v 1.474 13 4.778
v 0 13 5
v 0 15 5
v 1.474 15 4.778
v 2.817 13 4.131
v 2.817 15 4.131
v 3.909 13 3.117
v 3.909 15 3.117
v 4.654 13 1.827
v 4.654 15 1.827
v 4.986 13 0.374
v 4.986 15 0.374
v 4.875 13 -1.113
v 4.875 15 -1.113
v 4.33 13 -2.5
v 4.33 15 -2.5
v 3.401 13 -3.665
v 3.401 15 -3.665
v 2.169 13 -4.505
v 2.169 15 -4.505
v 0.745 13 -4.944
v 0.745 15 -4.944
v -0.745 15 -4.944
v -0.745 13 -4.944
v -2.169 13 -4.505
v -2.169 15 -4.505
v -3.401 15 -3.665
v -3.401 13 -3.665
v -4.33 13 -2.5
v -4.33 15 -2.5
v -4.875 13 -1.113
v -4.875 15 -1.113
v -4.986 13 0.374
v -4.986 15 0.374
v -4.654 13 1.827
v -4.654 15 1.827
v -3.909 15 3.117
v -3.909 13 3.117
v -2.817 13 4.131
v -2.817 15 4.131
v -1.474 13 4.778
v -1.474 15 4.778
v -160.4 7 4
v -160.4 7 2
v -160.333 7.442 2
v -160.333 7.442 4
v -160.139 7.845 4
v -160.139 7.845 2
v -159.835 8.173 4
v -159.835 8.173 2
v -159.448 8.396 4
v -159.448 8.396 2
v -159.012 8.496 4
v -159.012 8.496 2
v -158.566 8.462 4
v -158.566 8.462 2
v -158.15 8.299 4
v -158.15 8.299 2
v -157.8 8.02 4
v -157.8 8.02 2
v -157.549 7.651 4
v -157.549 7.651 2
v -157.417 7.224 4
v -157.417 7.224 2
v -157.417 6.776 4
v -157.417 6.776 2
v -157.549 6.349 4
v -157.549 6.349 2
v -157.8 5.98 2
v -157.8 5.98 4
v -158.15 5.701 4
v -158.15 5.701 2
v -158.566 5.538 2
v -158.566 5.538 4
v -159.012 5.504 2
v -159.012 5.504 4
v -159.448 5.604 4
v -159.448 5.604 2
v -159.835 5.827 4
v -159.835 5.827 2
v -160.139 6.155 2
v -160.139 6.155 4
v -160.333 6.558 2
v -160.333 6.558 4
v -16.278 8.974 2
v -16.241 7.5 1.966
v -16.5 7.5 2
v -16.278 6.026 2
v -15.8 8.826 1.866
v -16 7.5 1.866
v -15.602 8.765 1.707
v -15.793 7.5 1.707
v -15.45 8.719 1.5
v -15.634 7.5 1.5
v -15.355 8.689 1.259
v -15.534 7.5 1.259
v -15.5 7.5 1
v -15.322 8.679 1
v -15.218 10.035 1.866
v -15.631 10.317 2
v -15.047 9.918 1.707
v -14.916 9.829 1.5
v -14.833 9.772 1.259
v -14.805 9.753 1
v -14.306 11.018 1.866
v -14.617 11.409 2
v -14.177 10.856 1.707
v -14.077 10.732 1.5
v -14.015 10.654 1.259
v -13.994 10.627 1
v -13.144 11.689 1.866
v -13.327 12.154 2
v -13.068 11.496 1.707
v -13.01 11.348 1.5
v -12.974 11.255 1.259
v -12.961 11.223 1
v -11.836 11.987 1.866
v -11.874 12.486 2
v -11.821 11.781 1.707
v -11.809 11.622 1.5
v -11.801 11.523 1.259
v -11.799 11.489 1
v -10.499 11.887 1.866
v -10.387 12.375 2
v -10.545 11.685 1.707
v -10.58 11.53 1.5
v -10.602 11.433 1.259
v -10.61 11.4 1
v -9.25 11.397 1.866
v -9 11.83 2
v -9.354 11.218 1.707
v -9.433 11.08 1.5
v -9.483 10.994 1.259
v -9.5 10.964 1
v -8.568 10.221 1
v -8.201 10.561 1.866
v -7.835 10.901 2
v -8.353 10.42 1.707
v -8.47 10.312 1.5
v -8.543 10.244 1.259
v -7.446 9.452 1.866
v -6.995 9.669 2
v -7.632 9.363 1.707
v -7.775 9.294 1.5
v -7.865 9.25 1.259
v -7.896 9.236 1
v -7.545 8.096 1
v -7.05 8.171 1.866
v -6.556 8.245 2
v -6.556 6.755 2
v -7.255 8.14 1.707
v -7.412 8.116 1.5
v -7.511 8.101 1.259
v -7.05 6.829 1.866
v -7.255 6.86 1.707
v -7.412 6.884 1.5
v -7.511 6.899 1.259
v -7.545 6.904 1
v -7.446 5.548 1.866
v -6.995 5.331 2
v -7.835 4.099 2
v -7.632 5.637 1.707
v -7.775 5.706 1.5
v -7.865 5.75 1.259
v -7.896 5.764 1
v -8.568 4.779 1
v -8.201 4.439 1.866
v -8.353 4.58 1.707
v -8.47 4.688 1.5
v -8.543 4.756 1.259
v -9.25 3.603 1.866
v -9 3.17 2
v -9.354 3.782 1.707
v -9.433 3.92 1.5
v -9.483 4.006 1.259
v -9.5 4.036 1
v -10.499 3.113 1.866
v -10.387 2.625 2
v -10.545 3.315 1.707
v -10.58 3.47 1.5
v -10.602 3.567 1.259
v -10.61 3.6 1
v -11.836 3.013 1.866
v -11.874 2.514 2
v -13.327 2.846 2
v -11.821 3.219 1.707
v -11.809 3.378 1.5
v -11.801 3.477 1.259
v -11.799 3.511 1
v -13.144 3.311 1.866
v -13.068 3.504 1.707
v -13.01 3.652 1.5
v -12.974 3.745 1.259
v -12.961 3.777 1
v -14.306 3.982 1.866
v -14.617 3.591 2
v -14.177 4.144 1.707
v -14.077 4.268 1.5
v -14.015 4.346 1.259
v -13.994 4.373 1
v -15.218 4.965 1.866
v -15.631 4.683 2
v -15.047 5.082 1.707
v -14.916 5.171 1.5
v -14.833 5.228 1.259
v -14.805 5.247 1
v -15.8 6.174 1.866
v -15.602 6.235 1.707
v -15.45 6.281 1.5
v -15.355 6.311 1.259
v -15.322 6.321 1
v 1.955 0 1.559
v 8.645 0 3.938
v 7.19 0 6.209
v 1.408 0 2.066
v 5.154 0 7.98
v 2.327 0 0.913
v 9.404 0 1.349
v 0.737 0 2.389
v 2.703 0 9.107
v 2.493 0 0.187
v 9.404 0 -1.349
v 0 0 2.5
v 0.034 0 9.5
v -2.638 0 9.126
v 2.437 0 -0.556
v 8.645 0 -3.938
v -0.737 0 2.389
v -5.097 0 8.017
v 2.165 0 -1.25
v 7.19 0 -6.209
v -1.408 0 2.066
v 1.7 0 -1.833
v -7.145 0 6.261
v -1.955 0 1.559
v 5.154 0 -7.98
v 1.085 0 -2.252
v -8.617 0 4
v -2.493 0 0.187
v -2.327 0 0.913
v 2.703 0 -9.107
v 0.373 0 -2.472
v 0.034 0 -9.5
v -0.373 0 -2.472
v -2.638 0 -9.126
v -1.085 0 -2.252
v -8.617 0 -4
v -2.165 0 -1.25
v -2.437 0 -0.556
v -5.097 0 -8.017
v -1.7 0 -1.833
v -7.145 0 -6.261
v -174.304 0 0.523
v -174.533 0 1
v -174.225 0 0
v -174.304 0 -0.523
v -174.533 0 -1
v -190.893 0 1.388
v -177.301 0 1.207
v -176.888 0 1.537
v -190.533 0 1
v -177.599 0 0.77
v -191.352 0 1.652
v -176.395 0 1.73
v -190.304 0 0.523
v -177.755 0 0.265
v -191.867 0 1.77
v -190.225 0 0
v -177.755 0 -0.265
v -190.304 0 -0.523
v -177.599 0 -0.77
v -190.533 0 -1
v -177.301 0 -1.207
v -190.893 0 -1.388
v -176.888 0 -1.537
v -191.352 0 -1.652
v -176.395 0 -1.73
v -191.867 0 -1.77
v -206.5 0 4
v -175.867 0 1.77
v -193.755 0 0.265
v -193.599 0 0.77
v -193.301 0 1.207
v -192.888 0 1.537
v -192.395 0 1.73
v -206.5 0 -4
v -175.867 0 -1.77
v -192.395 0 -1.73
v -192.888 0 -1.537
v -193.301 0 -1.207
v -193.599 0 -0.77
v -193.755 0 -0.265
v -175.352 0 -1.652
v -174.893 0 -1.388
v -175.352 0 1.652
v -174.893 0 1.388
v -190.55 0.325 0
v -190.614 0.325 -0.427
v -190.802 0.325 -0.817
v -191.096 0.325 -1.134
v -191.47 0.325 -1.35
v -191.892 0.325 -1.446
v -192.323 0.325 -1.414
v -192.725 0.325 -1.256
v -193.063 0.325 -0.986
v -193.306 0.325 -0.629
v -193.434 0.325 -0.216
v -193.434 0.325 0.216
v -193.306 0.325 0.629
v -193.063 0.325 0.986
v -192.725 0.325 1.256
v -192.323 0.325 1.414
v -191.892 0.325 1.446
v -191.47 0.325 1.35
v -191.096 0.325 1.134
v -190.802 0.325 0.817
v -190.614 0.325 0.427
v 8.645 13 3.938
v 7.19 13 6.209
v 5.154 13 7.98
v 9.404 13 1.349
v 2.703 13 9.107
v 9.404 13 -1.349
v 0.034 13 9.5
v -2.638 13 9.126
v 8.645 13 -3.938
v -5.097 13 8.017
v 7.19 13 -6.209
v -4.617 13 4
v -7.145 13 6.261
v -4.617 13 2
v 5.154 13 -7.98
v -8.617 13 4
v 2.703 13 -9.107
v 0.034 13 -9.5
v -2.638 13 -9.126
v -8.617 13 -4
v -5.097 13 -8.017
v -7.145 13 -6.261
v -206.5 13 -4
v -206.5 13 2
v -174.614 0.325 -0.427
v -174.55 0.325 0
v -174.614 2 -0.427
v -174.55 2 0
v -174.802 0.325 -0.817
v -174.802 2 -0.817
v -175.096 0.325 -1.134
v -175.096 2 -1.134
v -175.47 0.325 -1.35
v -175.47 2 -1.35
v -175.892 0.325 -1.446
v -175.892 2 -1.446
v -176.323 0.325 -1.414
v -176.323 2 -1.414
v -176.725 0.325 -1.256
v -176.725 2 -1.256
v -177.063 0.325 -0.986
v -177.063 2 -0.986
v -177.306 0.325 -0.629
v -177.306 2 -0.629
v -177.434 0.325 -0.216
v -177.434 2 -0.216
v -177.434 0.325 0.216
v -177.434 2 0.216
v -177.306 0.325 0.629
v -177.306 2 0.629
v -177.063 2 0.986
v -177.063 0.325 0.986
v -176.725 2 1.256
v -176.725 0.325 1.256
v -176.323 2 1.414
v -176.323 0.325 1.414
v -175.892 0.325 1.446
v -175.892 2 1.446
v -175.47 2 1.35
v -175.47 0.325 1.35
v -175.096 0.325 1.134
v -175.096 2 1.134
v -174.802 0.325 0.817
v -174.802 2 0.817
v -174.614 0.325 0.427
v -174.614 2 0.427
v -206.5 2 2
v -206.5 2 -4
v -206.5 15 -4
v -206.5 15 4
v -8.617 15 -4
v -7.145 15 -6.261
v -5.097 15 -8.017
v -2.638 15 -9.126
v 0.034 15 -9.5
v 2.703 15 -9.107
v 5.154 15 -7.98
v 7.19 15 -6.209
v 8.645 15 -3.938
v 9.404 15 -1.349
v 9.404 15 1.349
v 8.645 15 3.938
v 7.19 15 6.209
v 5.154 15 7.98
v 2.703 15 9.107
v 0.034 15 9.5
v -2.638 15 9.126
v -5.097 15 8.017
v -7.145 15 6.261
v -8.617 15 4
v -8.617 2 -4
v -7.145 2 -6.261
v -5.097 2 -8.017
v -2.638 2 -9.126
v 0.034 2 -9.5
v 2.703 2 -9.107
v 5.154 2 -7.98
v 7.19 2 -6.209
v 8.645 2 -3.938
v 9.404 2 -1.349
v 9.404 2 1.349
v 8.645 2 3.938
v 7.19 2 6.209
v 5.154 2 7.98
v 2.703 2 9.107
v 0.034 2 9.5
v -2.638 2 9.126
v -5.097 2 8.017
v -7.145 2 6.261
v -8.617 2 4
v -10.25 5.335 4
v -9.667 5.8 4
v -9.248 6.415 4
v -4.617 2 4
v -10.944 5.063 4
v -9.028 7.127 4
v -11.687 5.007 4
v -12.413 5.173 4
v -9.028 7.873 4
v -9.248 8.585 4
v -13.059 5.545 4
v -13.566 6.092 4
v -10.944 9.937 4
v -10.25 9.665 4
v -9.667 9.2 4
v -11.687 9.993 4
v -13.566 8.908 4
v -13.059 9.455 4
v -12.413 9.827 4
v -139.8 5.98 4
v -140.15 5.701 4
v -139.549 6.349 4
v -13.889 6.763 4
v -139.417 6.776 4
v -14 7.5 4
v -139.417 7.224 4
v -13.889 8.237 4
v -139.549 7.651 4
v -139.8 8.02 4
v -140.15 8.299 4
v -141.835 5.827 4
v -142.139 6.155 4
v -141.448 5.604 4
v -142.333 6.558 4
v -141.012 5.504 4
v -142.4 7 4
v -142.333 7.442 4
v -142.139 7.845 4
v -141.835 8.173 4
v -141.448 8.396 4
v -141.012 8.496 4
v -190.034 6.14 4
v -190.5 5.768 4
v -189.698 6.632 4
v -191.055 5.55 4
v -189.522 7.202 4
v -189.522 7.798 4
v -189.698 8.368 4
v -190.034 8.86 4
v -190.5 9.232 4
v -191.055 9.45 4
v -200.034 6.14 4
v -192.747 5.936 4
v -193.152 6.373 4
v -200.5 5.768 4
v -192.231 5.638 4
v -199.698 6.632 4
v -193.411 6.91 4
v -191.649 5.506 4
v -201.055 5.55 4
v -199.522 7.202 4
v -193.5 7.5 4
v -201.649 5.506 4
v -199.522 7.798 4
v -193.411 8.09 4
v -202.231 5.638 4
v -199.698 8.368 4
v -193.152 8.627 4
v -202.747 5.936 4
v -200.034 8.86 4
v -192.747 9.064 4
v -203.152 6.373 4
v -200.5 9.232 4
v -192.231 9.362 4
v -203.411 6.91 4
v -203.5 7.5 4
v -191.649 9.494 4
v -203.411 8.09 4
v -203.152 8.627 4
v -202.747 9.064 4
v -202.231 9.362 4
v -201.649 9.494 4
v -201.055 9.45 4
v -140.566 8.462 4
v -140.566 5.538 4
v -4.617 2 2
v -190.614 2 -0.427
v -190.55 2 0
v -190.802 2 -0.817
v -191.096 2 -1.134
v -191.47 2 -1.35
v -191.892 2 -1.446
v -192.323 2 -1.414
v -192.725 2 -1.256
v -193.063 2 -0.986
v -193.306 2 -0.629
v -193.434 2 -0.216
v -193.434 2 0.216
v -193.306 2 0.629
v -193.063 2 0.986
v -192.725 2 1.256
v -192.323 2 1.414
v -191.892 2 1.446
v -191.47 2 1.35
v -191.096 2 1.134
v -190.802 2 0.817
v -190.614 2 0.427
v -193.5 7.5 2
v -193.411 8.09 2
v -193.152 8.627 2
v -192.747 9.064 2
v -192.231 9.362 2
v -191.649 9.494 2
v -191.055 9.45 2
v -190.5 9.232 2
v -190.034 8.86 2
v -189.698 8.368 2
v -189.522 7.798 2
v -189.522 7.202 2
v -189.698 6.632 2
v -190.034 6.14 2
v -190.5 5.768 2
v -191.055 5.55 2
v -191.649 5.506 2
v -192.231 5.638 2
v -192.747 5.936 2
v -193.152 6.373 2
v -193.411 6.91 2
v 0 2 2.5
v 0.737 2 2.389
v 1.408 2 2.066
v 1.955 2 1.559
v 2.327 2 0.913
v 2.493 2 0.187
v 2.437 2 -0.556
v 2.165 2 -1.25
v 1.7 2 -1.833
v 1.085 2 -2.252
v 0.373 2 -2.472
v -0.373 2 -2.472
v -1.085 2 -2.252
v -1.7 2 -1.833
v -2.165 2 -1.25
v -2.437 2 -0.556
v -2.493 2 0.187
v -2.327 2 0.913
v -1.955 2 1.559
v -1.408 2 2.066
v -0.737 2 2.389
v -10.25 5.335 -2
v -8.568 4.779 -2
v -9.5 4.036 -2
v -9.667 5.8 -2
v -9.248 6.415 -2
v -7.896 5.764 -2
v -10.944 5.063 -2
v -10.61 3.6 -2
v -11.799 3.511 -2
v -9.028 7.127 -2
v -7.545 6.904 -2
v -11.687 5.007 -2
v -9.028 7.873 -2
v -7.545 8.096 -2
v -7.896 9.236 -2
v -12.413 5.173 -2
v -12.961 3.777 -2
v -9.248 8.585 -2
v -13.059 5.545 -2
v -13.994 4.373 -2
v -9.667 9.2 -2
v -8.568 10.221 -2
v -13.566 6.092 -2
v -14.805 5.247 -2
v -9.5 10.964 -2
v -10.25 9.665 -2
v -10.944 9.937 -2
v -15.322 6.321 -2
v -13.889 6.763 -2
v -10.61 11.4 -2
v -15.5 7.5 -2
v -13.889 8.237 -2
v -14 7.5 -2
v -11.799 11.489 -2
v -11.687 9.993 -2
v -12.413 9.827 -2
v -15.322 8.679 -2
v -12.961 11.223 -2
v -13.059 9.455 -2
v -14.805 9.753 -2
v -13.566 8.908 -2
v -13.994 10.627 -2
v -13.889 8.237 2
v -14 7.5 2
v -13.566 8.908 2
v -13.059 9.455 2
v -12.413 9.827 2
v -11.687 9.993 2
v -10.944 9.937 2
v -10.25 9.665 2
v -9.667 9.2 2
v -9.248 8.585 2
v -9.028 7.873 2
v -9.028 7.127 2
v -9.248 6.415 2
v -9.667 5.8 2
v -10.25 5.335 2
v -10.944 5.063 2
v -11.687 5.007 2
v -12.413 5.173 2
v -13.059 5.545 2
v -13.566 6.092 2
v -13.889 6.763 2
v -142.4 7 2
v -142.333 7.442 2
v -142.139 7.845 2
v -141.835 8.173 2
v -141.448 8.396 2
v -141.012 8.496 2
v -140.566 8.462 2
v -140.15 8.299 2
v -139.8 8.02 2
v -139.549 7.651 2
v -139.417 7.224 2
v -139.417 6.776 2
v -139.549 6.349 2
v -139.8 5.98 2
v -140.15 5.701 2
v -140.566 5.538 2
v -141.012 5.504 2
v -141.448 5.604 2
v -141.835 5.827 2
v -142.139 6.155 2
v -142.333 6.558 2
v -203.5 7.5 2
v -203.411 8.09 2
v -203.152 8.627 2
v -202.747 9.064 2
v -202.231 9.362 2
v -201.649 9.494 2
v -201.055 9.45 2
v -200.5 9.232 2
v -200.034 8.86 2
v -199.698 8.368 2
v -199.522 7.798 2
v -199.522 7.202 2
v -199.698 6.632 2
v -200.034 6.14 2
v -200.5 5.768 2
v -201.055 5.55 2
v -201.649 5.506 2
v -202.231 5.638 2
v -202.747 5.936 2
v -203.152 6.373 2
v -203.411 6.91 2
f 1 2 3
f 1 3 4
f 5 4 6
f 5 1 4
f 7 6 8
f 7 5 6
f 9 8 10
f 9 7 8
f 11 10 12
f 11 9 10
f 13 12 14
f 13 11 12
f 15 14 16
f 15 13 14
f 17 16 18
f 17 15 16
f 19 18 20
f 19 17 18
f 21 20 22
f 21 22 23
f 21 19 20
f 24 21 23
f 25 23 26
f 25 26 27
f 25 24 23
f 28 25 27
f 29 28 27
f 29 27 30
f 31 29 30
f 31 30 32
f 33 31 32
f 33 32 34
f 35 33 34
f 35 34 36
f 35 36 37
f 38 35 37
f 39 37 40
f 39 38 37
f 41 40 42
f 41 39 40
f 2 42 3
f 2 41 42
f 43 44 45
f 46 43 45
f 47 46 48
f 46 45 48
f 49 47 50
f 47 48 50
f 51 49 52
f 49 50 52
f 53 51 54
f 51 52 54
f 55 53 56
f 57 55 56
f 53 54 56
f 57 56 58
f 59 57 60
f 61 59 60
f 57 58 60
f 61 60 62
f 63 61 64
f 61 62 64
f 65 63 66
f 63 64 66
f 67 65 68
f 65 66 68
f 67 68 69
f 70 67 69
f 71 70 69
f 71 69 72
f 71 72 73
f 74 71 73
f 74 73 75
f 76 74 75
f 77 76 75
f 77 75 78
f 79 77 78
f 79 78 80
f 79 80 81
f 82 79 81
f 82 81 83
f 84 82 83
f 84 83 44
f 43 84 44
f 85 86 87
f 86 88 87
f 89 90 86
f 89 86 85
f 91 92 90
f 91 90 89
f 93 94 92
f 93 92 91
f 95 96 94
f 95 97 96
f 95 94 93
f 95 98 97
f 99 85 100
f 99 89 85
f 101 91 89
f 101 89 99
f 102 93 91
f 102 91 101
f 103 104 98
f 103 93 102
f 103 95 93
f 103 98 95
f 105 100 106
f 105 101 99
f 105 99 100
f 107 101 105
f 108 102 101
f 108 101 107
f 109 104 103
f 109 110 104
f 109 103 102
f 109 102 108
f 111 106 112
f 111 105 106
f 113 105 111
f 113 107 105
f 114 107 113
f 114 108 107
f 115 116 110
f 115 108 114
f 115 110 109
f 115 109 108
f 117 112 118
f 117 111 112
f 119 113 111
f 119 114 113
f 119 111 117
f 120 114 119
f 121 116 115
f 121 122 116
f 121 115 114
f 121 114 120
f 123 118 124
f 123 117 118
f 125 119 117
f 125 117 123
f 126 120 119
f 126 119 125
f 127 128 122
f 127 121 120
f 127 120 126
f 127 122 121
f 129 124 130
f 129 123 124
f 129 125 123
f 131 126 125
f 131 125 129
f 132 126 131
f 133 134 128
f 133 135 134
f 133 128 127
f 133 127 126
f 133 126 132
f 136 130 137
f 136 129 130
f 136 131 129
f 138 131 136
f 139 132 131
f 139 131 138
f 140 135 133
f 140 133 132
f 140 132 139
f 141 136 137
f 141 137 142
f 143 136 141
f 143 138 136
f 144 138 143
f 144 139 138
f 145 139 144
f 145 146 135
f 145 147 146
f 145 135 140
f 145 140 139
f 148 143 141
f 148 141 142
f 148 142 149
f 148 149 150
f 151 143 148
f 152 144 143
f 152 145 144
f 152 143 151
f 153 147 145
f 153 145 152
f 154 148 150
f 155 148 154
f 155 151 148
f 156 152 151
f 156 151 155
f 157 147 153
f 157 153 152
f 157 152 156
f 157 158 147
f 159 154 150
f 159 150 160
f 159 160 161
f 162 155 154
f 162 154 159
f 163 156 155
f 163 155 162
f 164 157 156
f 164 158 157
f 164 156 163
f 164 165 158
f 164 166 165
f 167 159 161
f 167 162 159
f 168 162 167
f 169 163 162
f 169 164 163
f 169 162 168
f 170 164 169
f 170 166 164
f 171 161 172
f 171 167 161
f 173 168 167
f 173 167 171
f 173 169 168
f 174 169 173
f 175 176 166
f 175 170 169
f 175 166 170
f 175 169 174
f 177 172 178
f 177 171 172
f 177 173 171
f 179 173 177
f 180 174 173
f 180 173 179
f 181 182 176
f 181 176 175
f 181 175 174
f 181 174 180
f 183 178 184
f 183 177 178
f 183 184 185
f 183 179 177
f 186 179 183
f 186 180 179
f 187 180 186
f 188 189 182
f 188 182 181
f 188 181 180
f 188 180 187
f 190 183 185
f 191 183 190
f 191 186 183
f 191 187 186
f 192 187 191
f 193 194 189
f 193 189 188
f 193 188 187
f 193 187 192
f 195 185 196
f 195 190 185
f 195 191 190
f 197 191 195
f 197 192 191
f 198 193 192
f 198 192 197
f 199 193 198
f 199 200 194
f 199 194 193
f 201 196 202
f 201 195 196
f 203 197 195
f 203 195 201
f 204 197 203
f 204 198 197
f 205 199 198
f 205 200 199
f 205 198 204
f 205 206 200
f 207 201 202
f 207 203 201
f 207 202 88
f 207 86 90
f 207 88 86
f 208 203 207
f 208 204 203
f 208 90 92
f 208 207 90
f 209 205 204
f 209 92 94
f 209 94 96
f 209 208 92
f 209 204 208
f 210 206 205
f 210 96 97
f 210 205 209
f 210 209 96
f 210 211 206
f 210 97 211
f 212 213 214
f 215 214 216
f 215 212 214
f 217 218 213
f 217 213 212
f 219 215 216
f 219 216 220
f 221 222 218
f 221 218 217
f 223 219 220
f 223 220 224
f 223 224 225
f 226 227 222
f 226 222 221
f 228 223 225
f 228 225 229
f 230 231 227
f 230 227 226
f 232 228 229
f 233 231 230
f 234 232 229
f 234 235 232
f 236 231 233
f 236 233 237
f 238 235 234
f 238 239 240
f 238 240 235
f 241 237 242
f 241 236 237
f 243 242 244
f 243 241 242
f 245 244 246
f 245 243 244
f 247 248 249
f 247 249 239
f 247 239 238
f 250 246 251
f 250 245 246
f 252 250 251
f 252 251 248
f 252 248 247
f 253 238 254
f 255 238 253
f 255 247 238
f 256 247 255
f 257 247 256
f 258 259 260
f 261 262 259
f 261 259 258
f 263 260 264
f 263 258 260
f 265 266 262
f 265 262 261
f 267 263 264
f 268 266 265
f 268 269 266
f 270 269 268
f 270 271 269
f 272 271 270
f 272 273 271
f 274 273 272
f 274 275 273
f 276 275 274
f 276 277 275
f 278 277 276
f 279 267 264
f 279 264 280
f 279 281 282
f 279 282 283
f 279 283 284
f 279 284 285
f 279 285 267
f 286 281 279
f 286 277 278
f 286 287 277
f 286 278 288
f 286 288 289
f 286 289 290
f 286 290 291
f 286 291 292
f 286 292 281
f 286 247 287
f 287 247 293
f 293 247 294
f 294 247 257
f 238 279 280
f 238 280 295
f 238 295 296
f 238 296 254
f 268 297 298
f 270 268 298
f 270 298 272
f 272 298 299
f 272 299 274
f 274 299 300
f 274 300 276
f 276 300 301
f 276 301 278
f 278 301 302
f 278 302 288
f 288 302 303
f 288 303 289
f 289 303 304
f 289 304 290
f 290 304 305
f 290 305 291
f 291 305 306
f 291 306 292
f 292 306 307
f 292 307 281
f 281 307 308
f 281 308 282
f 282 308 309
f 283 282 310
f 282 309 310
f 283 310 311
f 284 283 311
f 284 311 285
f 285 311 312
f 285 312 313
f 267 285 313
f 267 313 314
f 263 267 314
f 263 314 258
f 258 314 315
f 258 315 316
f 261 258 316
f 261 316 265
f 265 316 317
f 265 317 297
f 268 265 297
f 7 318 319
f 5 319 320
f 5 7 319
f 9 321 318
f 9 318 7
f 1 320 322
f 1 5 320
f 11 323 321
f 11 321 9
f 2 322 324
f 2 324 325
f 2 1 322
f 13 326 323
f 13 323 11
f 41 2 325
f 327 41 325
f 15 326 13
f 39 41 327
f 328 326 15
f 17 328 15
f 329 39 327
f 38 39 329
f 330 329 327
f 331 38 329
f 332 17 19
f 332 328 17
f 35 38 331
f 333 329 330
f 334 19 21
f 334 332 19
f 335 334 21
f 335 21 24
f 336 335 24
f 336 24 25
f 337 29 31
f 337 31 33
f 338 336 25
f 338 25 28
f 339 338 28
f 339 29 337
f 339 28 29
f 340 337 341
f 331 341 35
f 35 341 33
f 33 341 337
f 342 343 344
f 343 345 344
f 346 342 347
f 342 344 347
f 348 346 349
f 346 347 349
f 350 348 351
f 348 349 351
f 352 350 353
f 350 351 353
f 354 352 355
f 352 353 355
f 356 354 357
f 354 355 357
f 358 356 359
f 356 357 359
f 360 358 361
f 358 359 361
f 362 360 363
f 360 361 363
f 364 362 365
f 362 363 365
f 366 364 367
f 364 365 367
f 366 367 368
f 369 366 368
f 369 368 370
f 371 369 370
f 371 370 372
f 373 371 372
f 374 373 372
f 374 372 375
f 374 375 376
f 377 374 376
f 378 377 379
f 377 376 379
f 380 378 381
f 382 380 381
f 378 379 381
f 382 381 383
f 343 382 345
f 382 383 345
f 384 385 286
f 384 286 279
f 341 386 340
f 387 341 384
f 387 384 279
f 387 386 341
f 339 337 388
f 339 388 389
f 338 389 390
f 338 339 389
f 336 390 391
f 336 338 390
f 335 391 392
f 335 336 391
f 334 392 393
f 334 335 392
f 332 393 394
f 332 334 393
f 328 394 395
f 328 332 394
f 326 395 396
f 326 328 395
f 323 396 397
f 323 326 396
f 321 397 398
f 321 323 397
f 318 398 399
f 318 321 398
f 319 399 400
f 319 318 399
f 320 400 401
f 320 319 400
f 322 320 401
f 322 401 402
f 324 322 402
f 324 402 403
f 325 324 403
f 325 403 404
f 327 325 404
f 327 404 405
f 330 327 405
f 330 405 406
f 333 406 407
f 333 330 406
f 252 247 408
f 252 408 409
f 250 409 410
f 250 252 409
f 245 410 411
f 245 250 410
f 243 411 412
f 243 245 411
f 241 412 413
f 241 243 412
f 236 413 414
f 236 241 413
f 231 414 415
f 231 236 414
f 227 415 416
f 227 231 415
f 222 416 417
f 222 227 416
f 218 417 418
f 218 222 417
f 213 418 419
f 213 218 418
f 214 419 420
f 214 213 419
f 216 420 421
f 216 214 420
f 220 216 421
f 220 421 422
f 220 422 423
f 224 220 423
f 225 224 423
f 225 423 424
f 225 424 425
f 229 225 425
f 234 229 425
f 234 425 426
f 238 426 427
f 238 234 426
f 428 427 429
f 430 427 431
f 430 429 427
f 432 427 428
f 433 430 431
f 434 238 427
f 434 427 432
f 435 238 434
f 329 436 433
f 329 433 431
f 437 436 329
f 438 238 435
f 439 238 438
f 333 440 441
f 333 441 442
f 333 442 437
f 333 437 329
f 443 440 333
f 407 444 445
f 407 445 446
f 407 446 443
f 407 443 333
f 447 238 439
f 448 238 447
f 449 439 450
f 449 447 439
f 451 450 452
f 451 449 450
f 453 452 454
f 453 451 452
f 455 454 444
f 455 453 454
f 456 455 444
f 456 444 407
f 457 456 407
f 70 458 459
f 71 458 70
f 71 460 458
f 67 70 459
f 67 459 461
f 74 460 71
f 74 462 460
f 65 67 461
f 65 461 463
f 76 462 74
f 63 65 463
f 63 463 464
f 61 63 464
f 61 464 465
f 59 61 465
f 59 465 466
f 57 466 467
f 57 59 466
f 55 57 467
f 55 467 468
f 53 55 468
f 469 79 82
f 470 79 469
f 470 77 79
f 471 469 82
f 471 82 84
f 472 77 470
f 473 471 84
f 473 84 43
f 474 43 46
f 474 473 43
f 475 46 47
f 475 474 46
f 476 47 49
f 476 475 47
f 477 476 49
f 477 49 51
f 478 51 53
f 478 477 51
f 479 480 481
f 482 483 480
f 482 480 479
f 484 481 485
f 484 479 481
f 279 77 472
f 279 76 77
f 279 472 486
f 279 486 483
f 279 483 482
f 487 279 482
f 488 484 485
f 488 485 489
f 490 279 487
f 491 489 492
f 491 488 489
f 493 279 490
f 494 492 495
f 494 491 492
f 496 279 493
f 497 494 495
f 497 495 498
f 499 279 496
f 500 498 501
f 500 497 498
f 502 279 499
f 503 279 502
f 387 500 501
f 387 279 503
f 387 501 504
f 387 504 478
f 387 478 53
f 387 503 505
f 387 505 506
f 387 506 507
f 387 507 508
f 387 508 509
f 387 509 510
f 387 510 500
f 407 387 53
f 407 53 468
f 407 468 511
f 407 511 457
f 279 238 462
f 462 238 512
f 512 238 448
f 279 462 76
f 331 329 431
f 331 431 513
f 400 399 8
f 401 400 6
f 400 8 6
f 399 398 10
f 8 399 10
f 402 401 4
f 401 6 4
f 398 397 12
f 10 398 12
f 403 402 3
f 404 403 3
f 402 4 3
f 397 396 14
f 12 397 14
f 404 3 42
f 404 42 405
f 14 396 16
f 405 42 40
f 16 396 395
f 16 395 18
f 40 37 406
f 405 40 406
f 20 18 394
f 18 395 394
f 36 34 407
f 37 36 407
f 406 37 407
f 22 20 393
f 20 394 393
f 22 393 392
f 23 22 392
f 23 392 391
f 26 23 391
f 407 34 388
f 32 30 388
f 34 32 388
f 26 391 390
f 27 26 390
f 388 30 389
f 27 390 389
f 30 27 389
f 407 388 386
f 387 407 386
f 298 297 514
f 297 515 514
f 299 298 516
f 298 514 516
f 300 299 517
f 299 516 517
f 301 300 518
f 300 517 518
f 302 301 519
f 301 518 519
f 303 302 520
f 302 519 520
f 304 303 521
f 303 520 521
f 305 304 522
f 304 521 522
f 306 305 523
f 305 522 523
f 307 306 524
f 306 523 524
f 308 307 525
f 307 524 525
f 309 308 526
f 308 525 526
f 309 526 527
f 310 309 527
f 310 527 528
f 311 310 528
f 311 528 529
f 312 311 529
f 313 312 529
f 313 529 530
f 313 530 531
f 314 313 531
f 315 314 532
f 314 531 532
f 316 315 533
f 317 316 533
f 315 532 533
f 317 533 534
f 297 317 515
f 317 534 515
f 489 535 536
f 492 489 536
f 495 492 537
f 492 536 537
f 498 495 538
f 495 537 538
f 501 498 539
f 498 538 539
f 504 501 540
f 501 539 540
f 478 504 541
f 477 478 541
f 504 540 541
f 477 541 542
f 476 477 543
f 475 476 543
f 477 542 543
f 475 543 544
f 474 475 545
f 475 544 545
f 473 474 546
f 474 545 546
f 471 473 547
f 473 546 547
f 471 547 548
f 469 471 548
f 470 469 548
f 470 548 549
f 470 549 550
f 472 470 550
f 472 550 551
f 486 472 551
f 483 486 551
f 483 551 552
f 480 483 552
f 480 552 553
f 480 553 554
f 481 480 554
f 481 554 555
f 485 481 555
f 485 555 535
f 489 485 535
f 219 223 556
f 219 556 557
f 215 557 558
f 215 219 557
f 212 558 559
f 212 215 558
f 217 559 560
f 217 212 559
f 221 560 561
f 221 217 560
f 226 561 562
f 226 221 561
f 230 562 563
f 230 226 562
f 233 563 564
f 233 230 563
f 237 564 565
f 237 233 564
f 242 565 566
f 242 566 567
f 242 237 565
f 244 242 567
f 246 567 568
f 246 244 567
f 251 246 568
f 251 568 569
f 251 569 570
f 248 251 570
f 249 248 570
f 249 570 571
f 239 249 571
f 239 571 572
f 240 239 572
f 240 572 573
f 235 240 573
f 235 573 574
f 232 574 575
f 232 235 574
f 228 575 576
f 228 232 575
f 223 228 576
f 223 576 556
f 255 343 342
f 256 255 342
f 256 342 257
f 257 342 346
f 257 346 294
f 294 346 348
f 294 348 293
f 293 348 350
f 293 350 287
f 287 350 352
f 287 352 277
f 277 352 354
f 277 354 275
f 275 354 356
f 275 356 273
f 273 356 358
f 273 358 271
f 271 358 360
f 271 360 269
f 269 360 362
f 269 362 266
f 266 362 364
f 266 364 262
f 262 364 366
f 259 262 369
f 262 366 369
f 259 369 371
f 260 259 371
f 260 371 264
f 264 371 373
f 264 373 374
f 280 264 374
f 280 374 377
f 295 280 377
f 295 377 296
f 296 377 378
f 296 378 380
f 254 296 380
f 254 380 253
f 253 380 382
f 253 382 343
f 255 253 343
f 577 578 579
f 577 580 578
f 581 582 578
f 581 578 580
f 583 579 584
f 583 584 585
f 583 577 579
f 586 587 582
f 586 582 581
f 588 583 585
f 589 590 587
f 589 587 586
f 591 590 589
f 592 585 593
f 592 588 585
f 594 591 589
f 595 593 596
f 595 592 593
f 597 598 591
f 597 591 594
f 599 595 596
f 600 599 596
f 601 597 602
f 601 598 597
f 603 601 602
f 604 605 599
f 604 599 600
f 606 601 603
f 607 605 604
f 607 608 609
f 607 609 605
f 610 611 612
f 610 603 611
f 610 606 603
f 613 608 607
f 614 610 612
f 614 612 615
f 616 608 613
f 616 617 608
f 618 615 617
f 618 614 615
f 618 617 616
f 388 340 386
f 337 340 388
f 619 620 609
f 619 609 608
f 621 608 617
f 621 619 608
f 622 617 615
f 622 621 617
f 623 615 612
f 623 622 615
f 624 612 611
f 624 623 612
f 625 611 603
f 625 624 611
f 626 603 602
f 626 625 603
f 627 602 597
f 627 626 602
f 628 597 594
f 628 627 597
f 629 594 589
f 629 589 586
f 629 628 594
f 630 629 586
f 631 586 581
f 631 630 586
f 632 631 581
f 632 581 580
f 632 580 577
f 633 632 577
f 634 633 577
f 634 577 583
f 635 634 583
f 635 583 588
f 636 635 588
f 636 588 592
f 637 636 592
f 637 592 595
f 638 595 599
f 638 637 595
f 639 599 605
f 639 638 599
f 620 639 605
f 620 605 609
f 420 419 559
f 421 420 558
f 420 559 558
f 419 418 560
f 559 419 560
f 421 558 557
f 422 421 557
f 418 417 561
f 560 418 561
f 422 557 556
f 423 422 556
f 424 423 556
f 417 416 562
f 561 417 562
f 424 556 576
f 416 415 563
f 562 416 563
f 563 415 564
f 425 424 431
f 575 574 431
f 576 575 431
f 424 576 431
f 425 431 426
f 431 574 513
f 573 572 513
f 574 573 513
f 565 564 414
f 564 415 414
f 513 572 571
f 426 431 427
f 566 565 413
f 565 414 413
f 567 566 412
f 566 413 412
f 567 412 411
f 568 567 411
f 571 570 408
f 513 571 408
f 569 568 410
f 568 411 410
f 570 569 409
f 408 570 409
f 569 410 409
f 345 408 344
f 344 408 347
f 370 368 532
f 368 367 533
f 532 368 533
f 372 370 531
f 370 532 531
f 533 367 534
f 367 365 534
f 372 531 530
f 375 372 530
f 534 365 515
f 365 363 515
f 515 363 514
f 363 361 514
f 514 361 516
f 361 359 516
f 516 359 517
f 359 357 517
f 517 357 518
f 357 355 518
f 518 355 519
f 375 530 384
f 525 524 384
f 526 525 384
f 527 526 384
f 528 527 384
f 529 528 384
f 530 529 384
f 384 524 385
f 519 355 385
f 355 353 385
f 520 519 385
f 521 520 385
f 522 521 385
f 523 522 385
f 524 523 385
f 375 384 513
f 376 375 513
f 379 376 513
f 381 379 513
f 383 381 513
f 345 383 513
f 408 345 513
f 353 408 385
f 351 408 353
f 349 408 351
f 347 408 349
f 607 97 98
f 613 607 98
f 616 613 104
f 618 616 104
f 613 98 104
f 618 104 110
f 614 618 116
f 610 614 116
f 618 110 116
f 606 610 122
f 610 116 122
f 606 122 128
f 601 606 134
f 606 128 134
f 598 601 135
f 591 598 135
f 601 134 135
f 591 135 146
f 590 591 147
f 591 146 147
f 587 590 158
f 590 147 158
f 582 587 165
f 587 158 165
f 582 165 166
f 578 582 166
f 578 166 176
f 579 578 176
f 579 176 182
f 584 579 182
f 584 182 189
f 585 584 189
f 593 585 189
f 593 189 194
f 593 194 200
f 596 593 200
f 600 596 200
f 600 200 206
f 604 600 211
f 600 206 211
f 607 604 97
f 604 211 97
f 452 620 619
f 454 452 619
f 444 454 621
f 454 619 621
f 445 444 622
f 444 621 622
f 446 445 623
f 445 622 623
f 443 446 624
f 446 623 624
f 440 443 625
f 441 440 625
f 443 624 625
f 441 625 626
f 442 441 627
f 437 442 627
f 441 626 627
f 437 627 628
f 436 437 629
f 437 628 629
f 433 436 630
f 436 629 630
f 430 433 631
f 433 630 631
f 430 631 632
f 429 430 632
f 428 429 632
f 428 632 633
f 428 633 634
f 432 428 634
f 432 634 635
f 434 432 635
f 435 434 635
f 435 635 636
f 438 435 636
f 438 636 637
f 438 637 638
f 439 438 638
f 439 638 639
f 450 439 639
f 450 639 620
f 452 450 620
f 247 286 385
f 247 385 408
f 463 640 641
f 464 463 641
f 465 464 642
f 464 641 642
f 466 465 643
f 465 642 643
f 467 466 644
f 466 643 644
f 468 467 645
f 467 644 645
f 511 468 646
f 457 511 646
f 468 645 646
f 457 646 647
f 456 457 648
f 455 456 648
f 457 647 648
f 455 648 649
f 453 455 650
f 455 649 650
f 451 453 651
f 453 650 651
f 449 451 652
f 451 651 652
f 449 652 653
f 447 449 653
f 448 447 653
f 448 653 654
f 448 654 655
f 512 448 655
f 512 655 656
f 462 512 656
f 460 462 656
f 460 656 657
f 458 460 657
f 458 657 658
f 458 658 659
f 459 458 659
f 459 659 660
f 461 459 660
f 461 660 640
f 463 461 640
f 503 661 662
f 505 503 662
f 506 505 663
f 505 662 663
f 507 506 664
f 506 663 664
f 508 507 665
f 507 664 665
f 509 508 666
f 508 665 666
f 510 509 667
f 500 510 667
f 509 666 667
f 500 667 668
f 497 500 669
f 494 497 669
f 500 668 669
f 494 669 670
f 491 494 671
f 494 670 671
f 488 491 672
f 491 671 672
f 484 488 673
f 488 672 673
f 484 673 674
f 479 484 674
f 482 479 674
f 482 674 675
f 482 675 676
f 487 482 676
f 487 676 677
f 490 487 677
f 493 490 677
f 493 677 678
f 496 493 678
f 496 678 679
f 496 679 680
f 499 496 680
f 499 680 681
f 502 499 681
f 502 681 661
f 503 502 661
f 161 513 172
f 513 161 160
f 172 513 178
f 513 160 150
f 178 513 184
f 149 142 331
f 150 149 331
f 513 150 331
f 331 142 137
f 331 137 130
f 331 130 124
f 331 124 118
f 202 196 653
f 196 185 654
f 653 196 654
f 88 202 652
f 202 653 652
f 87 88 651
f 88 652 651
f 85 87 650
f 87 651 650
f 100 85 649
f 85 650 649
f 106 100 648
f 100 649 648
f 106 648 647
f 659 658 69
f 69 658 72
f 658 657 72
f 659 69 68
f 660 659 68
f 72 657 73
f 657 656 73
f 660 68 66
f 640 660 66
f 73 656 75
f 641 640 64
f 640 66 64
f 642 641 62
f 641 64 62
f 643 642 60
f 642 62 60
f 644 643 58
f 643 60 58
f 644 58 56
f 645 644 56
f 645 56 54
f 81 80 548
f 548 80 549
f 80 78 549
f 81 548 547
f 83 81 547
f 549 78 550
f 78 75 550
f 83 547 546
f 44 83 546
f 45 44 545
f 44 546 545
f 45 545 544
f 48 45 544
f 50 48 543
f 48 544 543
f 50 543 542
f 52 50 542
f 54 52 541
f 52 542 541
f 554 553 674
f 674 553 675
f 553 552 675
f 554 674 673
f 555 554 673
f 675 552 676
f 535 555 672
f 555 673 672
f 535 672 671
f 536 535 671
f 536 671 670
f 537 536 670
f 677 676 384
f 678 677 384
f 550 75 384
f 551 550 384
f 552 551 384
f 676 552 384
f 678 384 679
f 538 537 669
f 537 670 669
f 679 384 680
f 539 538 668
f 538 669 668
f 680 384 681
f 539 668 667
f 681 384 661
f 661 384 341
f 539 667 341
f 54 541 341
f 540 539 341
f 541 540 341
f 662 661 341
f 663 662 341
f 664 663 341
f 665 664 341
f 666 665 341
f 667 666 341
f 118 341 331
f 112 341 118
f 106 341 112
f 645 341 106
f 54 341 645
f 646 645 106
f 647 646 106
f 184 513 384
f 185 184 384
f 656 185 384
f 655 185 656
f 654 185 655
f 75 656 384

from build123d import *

# Parameters (mm, degrees)
SKETCH1_R                         = 2.5
BOSS_EXTRUDE3_DEPTH               = 2
SKETCH5_W                         = 2
SKETCH5_H                         = 11
BOSS_EXTRUDE4_DEPTH               = 197.88316
SKETCH6_R                         = 5
BOSS_EXTRUDE5_DEPTH               = 2
SKETCH8_W                         = 2
SKETCH8_H                         = 11
BOSS_EXTRUDE6_DEPTH               = 4
CUT_EXTRUDE8_REACH                = 209.363
SKETCH10_R                        = 2
SKETCH10_R_2                      = 1.5
SKETCH11_R                        = 4
SKETCH11_R_2                      = 2.5
BOSS_EXTRUDE7_DEPTH               = 4
CUT_EXTRUDE9_REACH                = 209.363
SKETCH12_R                        = 2.5
M3_5X0_6_TAPPED_HOLE2_D           = 2.9
M3_5X0_6_TAPPED_HOLE2_DEPTH       = 2
M3_5X0_6_TAPPED_HOLE2_CSINK_D     = 3.55
M3_5X0_6_TAPPED_HOLE2_CSINK_ANGLE = 90
M3_5X0_6_TAPPED_HOLE2_TIP         = 0.871247898
FILLET1_R                         = 1


with BuildPart() as part:
    # Sketch1 → Boss-Extrude3 (new body)
    with BuildSketch(Plane(origin=(0, 0, 0), x_dir=(1, 0, 0), z_dir=(0, 1, 0))):
        with BuildLine():
            Line((-206.5, 4), (-8.61684397, 4))
            ThreePointArc((-8.61684397, 4), (9.5, 0), (-8.61684397, -4))
            Line((-8.61684397, -4), (-206.5, -4))
            Line((-206.5, -4), (-206.5, 4))
        make_face()
        with Locations(Location((0, 0, 0), (0, 0, 270))):
            Circle(SKETCH1_R, mode=Mode.SUBTRACT)
    extrude(amount=BOSS_EXTRUDE3_DEPTH)

    # Sketch5 → Boss-Extrude4 (add)
    with BuildSketch(Plane.ZY.offset(206.5)):
        with Locations((3, 7.5)):
            Rectangle(SKETCH5_W, SKETCH5_H)
    extrude(amount=-BOSS_EXTRUDE4_DEPTH)


with BuildPart() as boss_extrude5_tool:
    # Sketch6 → Boss-Extrude5 (new body)
    with BuildSketch(Plane(origin=(0, 13, 0), x_dir=(1, 0, 0), z_dir=(0, 1, 0))):
        with BuildLine():
            Line((-206.5, 4), (-8.61684397, 4))
            ThreePointArc((-8.61684397, 4), (9.5, 0), (-8.61684397, -4))
            Line((-8.61684397, -4), (-206.5, -4))
            Line((-206.5, -4), (-206.5, 4))
        make_face()
        with Locations(Location((0, 0, 0), (0, 0, 270))):
            Circle(SKETCH6_R, mode=Mode.SUBTRACT)
    extrude(amount=BOSS_EXTRUDE5_DEPTH)


with BuildPart() as part_1:
    add(part.part)


with BuildPart() as part_2:
    # Boss-Extrude5: joined with boss_extrude5_tool
    add(part_1.part.fuse(boss_extrude5_tool.part, tol=0.00001))

    # Sketch8 → Boss-Extrude6 (add)
    with BuildSketch(Plane(origin=(-8.61684397, 0, 0), x_dir=(0, 0, -1), z_dir=(1, 0, 0))):
        with Locations((-3, 7.5)):
            Rectangle(SKETCH8_W, SKETCH8_H)
    extrude(amount=BOSS_EXTRUDE6_DEPTH)

    # Sketch10 → Cut-Extrude8 (cut, up to next)
    with BuildSketch(Plane(origin=(0, 0, 2), x_dir=(-1, 0, 0), z_dir=(0, 0, -1)), mode=Mode.PRIVATE) as cut_extrude8_sk1:
        with Locations((201.5, 7.5)):
            Circle(SKETCH10_R)
    cut_extrude8_tool1 = extrude(cut_extrude8_sk1.sketch, amount=-CUT_EXTRUDE8_REACH, mode=Mode.PRIVATE) & part_2.part
    # Sketch10 → Cut-Extrude8 (cut, up to next)
    with BuildSketch(Plane(origin=(0, 0, 2), x_dir=(-1, 0, 0), z_dir=(0, 0, -1)), mode=Mode.PRIVATE) as cut_extrude8_sk2:
        with Locations((191.5, 7.5)):
            Circle(SKETCH10_R)
    cut_extrude8_tool2 = extrude(cut_extrude8_sk2.sketch, amount=-CUT_EXTRUDE8_REACH, mode=Mode.PRIVATE) & part_2.part
    # Sketch10 → Cut-Extrude8 (cut, up to next)
    with BuildSketch(Plane(origin=(0, 0, 2), x_dir=(-1, 0, 0), z_dir=(0, 0, -1)), mode=Mode.PRIVATE) as cut_extrude8_sk3:
        with Locations((158.9, 7)):
            Circle(SKETCH10_R_2)
    cut_extrude8_tool3 = extrude(cut_extrude8_sk3.sketch, amount=-CUT_EXTRUDE8_REACH, mode=Mode.PRIVATE) & part_2.part
    # Sketch10 → Cut-Extrude8 (cut, up to next)
    with BuildSketch(Plane(origin=(0, 0, 2), x_dir=(-1, 0, 0), z_dir=(0, 0, -1)), mode=Mode.PRIVATE) as cut_extrude8_sk4:
        with Locations((140.9, 7)):
            Circle(SKETCH10_R_2)
    cut_extrude8_tool4 = extrude(cut_extrude8_sk4.sketch, amount=-CUT_EXTRUDE8_REACH, mode=Mode.PRIVATE) & part_2.part
    add(cut_extrude8_tool1.solids().sort_by_distance((-201.5, 7.5, 2))[0], mode=Mode.SUBTRACT)
    add(cut_extrude8_tool2.solids().sort_by_distance((-191.5, 7.5, 2))[0], mode=Mode.SUBTRACT)
    add(cut_extrude8_tool3.solids().sort_by_distance((-158.9, 7, 2))[0], mode=Mode.SUBTRACT)
    add(cut_extrude8_tool4.solids().sort_by_distance((-140.9, 7, 2))[0], mode=Mode.SUBTRACT)

    # Sketch11 → Boss-Extrude7 (add)
    with BuildSketch(Plane(origin=(0, 0, 2), x_dir=(-1, 0, 0), z_dir=(0, 0, -1))):
        with Locations((11.5, 7.5)):
            Circle(SKETCH11_R)
        with Locations((11.5, 7.5)):
            Circle(SKETCH11_R_2, mode=Mode.SUBTRACT)
    extrude(amount=BOSS_EXTRUDE7_DEPTH)

    # Sketch12 → Cut-Extrude9 (cut, up to next)
    with BuildSketch(Plane(origin=(0, 0, 2), x_dir=(-1, 0, 0), z_dir=(0, 0, -1)), mode=Mode.PRIVATE) as cut_extrude9_sk1:
        with Locations((11.5, 7.5)):
            Circle(SKETCH12_R)
    cut_extrude9_tool1 = extrude(cut_extrude9_sk1.sketch, amount=-CUT_EXTRUDE9_REACH, mode=Mode.PRIVATE) & part_2.part
    add(cut_extrude9_tool1.solids().sort_by_distance((-11.5, 7.5, 2))[0], mode=Mode.SUBTRACT)

    # M3.5x0.6 Tapped Hole2
    with Locations(Plane(origin=(0, 0, 0), x_dir=(-1, 0, 0), z_dir=(0, -1, 0))):
        with Locations((192, 0), (176, 0)):
            CounterSinkHole(M3_5X0_6_TAPPED_HOLE2_D / 2, M3_5X0_6_TAPPED_HOLE2_CSINK_D / 2, depth=M3_5X0_6_TAPPED_HOLE2_DEPTH, counter_sink_angle=M3_5X0_6_TAPPED_HOLE2_CSINK_ANGLE)
            with Locations((0, 0, -(M3_5X0_6_TAPPED_HOLE2_DEPTH + M3_5X0_6_TAPPED_HOLE2_TIP / 2))):  # 118° drill point
                Cone(0, M3_5X0_6_TAPPED_HOLE2_D / 2, M3_5X0_6_TAPPED_HOLE2_TIP, mode=Mode.SUBTRACT)

    # Fillet1
    fillet1_edges = [part_2.edges().sort_by_distance(p)[0] for p in [
        (-7.5, 7.5, 2),
    ]]
    fillet(fillet1_edges, radius=FILLET1_R)


solid = part_2.part
